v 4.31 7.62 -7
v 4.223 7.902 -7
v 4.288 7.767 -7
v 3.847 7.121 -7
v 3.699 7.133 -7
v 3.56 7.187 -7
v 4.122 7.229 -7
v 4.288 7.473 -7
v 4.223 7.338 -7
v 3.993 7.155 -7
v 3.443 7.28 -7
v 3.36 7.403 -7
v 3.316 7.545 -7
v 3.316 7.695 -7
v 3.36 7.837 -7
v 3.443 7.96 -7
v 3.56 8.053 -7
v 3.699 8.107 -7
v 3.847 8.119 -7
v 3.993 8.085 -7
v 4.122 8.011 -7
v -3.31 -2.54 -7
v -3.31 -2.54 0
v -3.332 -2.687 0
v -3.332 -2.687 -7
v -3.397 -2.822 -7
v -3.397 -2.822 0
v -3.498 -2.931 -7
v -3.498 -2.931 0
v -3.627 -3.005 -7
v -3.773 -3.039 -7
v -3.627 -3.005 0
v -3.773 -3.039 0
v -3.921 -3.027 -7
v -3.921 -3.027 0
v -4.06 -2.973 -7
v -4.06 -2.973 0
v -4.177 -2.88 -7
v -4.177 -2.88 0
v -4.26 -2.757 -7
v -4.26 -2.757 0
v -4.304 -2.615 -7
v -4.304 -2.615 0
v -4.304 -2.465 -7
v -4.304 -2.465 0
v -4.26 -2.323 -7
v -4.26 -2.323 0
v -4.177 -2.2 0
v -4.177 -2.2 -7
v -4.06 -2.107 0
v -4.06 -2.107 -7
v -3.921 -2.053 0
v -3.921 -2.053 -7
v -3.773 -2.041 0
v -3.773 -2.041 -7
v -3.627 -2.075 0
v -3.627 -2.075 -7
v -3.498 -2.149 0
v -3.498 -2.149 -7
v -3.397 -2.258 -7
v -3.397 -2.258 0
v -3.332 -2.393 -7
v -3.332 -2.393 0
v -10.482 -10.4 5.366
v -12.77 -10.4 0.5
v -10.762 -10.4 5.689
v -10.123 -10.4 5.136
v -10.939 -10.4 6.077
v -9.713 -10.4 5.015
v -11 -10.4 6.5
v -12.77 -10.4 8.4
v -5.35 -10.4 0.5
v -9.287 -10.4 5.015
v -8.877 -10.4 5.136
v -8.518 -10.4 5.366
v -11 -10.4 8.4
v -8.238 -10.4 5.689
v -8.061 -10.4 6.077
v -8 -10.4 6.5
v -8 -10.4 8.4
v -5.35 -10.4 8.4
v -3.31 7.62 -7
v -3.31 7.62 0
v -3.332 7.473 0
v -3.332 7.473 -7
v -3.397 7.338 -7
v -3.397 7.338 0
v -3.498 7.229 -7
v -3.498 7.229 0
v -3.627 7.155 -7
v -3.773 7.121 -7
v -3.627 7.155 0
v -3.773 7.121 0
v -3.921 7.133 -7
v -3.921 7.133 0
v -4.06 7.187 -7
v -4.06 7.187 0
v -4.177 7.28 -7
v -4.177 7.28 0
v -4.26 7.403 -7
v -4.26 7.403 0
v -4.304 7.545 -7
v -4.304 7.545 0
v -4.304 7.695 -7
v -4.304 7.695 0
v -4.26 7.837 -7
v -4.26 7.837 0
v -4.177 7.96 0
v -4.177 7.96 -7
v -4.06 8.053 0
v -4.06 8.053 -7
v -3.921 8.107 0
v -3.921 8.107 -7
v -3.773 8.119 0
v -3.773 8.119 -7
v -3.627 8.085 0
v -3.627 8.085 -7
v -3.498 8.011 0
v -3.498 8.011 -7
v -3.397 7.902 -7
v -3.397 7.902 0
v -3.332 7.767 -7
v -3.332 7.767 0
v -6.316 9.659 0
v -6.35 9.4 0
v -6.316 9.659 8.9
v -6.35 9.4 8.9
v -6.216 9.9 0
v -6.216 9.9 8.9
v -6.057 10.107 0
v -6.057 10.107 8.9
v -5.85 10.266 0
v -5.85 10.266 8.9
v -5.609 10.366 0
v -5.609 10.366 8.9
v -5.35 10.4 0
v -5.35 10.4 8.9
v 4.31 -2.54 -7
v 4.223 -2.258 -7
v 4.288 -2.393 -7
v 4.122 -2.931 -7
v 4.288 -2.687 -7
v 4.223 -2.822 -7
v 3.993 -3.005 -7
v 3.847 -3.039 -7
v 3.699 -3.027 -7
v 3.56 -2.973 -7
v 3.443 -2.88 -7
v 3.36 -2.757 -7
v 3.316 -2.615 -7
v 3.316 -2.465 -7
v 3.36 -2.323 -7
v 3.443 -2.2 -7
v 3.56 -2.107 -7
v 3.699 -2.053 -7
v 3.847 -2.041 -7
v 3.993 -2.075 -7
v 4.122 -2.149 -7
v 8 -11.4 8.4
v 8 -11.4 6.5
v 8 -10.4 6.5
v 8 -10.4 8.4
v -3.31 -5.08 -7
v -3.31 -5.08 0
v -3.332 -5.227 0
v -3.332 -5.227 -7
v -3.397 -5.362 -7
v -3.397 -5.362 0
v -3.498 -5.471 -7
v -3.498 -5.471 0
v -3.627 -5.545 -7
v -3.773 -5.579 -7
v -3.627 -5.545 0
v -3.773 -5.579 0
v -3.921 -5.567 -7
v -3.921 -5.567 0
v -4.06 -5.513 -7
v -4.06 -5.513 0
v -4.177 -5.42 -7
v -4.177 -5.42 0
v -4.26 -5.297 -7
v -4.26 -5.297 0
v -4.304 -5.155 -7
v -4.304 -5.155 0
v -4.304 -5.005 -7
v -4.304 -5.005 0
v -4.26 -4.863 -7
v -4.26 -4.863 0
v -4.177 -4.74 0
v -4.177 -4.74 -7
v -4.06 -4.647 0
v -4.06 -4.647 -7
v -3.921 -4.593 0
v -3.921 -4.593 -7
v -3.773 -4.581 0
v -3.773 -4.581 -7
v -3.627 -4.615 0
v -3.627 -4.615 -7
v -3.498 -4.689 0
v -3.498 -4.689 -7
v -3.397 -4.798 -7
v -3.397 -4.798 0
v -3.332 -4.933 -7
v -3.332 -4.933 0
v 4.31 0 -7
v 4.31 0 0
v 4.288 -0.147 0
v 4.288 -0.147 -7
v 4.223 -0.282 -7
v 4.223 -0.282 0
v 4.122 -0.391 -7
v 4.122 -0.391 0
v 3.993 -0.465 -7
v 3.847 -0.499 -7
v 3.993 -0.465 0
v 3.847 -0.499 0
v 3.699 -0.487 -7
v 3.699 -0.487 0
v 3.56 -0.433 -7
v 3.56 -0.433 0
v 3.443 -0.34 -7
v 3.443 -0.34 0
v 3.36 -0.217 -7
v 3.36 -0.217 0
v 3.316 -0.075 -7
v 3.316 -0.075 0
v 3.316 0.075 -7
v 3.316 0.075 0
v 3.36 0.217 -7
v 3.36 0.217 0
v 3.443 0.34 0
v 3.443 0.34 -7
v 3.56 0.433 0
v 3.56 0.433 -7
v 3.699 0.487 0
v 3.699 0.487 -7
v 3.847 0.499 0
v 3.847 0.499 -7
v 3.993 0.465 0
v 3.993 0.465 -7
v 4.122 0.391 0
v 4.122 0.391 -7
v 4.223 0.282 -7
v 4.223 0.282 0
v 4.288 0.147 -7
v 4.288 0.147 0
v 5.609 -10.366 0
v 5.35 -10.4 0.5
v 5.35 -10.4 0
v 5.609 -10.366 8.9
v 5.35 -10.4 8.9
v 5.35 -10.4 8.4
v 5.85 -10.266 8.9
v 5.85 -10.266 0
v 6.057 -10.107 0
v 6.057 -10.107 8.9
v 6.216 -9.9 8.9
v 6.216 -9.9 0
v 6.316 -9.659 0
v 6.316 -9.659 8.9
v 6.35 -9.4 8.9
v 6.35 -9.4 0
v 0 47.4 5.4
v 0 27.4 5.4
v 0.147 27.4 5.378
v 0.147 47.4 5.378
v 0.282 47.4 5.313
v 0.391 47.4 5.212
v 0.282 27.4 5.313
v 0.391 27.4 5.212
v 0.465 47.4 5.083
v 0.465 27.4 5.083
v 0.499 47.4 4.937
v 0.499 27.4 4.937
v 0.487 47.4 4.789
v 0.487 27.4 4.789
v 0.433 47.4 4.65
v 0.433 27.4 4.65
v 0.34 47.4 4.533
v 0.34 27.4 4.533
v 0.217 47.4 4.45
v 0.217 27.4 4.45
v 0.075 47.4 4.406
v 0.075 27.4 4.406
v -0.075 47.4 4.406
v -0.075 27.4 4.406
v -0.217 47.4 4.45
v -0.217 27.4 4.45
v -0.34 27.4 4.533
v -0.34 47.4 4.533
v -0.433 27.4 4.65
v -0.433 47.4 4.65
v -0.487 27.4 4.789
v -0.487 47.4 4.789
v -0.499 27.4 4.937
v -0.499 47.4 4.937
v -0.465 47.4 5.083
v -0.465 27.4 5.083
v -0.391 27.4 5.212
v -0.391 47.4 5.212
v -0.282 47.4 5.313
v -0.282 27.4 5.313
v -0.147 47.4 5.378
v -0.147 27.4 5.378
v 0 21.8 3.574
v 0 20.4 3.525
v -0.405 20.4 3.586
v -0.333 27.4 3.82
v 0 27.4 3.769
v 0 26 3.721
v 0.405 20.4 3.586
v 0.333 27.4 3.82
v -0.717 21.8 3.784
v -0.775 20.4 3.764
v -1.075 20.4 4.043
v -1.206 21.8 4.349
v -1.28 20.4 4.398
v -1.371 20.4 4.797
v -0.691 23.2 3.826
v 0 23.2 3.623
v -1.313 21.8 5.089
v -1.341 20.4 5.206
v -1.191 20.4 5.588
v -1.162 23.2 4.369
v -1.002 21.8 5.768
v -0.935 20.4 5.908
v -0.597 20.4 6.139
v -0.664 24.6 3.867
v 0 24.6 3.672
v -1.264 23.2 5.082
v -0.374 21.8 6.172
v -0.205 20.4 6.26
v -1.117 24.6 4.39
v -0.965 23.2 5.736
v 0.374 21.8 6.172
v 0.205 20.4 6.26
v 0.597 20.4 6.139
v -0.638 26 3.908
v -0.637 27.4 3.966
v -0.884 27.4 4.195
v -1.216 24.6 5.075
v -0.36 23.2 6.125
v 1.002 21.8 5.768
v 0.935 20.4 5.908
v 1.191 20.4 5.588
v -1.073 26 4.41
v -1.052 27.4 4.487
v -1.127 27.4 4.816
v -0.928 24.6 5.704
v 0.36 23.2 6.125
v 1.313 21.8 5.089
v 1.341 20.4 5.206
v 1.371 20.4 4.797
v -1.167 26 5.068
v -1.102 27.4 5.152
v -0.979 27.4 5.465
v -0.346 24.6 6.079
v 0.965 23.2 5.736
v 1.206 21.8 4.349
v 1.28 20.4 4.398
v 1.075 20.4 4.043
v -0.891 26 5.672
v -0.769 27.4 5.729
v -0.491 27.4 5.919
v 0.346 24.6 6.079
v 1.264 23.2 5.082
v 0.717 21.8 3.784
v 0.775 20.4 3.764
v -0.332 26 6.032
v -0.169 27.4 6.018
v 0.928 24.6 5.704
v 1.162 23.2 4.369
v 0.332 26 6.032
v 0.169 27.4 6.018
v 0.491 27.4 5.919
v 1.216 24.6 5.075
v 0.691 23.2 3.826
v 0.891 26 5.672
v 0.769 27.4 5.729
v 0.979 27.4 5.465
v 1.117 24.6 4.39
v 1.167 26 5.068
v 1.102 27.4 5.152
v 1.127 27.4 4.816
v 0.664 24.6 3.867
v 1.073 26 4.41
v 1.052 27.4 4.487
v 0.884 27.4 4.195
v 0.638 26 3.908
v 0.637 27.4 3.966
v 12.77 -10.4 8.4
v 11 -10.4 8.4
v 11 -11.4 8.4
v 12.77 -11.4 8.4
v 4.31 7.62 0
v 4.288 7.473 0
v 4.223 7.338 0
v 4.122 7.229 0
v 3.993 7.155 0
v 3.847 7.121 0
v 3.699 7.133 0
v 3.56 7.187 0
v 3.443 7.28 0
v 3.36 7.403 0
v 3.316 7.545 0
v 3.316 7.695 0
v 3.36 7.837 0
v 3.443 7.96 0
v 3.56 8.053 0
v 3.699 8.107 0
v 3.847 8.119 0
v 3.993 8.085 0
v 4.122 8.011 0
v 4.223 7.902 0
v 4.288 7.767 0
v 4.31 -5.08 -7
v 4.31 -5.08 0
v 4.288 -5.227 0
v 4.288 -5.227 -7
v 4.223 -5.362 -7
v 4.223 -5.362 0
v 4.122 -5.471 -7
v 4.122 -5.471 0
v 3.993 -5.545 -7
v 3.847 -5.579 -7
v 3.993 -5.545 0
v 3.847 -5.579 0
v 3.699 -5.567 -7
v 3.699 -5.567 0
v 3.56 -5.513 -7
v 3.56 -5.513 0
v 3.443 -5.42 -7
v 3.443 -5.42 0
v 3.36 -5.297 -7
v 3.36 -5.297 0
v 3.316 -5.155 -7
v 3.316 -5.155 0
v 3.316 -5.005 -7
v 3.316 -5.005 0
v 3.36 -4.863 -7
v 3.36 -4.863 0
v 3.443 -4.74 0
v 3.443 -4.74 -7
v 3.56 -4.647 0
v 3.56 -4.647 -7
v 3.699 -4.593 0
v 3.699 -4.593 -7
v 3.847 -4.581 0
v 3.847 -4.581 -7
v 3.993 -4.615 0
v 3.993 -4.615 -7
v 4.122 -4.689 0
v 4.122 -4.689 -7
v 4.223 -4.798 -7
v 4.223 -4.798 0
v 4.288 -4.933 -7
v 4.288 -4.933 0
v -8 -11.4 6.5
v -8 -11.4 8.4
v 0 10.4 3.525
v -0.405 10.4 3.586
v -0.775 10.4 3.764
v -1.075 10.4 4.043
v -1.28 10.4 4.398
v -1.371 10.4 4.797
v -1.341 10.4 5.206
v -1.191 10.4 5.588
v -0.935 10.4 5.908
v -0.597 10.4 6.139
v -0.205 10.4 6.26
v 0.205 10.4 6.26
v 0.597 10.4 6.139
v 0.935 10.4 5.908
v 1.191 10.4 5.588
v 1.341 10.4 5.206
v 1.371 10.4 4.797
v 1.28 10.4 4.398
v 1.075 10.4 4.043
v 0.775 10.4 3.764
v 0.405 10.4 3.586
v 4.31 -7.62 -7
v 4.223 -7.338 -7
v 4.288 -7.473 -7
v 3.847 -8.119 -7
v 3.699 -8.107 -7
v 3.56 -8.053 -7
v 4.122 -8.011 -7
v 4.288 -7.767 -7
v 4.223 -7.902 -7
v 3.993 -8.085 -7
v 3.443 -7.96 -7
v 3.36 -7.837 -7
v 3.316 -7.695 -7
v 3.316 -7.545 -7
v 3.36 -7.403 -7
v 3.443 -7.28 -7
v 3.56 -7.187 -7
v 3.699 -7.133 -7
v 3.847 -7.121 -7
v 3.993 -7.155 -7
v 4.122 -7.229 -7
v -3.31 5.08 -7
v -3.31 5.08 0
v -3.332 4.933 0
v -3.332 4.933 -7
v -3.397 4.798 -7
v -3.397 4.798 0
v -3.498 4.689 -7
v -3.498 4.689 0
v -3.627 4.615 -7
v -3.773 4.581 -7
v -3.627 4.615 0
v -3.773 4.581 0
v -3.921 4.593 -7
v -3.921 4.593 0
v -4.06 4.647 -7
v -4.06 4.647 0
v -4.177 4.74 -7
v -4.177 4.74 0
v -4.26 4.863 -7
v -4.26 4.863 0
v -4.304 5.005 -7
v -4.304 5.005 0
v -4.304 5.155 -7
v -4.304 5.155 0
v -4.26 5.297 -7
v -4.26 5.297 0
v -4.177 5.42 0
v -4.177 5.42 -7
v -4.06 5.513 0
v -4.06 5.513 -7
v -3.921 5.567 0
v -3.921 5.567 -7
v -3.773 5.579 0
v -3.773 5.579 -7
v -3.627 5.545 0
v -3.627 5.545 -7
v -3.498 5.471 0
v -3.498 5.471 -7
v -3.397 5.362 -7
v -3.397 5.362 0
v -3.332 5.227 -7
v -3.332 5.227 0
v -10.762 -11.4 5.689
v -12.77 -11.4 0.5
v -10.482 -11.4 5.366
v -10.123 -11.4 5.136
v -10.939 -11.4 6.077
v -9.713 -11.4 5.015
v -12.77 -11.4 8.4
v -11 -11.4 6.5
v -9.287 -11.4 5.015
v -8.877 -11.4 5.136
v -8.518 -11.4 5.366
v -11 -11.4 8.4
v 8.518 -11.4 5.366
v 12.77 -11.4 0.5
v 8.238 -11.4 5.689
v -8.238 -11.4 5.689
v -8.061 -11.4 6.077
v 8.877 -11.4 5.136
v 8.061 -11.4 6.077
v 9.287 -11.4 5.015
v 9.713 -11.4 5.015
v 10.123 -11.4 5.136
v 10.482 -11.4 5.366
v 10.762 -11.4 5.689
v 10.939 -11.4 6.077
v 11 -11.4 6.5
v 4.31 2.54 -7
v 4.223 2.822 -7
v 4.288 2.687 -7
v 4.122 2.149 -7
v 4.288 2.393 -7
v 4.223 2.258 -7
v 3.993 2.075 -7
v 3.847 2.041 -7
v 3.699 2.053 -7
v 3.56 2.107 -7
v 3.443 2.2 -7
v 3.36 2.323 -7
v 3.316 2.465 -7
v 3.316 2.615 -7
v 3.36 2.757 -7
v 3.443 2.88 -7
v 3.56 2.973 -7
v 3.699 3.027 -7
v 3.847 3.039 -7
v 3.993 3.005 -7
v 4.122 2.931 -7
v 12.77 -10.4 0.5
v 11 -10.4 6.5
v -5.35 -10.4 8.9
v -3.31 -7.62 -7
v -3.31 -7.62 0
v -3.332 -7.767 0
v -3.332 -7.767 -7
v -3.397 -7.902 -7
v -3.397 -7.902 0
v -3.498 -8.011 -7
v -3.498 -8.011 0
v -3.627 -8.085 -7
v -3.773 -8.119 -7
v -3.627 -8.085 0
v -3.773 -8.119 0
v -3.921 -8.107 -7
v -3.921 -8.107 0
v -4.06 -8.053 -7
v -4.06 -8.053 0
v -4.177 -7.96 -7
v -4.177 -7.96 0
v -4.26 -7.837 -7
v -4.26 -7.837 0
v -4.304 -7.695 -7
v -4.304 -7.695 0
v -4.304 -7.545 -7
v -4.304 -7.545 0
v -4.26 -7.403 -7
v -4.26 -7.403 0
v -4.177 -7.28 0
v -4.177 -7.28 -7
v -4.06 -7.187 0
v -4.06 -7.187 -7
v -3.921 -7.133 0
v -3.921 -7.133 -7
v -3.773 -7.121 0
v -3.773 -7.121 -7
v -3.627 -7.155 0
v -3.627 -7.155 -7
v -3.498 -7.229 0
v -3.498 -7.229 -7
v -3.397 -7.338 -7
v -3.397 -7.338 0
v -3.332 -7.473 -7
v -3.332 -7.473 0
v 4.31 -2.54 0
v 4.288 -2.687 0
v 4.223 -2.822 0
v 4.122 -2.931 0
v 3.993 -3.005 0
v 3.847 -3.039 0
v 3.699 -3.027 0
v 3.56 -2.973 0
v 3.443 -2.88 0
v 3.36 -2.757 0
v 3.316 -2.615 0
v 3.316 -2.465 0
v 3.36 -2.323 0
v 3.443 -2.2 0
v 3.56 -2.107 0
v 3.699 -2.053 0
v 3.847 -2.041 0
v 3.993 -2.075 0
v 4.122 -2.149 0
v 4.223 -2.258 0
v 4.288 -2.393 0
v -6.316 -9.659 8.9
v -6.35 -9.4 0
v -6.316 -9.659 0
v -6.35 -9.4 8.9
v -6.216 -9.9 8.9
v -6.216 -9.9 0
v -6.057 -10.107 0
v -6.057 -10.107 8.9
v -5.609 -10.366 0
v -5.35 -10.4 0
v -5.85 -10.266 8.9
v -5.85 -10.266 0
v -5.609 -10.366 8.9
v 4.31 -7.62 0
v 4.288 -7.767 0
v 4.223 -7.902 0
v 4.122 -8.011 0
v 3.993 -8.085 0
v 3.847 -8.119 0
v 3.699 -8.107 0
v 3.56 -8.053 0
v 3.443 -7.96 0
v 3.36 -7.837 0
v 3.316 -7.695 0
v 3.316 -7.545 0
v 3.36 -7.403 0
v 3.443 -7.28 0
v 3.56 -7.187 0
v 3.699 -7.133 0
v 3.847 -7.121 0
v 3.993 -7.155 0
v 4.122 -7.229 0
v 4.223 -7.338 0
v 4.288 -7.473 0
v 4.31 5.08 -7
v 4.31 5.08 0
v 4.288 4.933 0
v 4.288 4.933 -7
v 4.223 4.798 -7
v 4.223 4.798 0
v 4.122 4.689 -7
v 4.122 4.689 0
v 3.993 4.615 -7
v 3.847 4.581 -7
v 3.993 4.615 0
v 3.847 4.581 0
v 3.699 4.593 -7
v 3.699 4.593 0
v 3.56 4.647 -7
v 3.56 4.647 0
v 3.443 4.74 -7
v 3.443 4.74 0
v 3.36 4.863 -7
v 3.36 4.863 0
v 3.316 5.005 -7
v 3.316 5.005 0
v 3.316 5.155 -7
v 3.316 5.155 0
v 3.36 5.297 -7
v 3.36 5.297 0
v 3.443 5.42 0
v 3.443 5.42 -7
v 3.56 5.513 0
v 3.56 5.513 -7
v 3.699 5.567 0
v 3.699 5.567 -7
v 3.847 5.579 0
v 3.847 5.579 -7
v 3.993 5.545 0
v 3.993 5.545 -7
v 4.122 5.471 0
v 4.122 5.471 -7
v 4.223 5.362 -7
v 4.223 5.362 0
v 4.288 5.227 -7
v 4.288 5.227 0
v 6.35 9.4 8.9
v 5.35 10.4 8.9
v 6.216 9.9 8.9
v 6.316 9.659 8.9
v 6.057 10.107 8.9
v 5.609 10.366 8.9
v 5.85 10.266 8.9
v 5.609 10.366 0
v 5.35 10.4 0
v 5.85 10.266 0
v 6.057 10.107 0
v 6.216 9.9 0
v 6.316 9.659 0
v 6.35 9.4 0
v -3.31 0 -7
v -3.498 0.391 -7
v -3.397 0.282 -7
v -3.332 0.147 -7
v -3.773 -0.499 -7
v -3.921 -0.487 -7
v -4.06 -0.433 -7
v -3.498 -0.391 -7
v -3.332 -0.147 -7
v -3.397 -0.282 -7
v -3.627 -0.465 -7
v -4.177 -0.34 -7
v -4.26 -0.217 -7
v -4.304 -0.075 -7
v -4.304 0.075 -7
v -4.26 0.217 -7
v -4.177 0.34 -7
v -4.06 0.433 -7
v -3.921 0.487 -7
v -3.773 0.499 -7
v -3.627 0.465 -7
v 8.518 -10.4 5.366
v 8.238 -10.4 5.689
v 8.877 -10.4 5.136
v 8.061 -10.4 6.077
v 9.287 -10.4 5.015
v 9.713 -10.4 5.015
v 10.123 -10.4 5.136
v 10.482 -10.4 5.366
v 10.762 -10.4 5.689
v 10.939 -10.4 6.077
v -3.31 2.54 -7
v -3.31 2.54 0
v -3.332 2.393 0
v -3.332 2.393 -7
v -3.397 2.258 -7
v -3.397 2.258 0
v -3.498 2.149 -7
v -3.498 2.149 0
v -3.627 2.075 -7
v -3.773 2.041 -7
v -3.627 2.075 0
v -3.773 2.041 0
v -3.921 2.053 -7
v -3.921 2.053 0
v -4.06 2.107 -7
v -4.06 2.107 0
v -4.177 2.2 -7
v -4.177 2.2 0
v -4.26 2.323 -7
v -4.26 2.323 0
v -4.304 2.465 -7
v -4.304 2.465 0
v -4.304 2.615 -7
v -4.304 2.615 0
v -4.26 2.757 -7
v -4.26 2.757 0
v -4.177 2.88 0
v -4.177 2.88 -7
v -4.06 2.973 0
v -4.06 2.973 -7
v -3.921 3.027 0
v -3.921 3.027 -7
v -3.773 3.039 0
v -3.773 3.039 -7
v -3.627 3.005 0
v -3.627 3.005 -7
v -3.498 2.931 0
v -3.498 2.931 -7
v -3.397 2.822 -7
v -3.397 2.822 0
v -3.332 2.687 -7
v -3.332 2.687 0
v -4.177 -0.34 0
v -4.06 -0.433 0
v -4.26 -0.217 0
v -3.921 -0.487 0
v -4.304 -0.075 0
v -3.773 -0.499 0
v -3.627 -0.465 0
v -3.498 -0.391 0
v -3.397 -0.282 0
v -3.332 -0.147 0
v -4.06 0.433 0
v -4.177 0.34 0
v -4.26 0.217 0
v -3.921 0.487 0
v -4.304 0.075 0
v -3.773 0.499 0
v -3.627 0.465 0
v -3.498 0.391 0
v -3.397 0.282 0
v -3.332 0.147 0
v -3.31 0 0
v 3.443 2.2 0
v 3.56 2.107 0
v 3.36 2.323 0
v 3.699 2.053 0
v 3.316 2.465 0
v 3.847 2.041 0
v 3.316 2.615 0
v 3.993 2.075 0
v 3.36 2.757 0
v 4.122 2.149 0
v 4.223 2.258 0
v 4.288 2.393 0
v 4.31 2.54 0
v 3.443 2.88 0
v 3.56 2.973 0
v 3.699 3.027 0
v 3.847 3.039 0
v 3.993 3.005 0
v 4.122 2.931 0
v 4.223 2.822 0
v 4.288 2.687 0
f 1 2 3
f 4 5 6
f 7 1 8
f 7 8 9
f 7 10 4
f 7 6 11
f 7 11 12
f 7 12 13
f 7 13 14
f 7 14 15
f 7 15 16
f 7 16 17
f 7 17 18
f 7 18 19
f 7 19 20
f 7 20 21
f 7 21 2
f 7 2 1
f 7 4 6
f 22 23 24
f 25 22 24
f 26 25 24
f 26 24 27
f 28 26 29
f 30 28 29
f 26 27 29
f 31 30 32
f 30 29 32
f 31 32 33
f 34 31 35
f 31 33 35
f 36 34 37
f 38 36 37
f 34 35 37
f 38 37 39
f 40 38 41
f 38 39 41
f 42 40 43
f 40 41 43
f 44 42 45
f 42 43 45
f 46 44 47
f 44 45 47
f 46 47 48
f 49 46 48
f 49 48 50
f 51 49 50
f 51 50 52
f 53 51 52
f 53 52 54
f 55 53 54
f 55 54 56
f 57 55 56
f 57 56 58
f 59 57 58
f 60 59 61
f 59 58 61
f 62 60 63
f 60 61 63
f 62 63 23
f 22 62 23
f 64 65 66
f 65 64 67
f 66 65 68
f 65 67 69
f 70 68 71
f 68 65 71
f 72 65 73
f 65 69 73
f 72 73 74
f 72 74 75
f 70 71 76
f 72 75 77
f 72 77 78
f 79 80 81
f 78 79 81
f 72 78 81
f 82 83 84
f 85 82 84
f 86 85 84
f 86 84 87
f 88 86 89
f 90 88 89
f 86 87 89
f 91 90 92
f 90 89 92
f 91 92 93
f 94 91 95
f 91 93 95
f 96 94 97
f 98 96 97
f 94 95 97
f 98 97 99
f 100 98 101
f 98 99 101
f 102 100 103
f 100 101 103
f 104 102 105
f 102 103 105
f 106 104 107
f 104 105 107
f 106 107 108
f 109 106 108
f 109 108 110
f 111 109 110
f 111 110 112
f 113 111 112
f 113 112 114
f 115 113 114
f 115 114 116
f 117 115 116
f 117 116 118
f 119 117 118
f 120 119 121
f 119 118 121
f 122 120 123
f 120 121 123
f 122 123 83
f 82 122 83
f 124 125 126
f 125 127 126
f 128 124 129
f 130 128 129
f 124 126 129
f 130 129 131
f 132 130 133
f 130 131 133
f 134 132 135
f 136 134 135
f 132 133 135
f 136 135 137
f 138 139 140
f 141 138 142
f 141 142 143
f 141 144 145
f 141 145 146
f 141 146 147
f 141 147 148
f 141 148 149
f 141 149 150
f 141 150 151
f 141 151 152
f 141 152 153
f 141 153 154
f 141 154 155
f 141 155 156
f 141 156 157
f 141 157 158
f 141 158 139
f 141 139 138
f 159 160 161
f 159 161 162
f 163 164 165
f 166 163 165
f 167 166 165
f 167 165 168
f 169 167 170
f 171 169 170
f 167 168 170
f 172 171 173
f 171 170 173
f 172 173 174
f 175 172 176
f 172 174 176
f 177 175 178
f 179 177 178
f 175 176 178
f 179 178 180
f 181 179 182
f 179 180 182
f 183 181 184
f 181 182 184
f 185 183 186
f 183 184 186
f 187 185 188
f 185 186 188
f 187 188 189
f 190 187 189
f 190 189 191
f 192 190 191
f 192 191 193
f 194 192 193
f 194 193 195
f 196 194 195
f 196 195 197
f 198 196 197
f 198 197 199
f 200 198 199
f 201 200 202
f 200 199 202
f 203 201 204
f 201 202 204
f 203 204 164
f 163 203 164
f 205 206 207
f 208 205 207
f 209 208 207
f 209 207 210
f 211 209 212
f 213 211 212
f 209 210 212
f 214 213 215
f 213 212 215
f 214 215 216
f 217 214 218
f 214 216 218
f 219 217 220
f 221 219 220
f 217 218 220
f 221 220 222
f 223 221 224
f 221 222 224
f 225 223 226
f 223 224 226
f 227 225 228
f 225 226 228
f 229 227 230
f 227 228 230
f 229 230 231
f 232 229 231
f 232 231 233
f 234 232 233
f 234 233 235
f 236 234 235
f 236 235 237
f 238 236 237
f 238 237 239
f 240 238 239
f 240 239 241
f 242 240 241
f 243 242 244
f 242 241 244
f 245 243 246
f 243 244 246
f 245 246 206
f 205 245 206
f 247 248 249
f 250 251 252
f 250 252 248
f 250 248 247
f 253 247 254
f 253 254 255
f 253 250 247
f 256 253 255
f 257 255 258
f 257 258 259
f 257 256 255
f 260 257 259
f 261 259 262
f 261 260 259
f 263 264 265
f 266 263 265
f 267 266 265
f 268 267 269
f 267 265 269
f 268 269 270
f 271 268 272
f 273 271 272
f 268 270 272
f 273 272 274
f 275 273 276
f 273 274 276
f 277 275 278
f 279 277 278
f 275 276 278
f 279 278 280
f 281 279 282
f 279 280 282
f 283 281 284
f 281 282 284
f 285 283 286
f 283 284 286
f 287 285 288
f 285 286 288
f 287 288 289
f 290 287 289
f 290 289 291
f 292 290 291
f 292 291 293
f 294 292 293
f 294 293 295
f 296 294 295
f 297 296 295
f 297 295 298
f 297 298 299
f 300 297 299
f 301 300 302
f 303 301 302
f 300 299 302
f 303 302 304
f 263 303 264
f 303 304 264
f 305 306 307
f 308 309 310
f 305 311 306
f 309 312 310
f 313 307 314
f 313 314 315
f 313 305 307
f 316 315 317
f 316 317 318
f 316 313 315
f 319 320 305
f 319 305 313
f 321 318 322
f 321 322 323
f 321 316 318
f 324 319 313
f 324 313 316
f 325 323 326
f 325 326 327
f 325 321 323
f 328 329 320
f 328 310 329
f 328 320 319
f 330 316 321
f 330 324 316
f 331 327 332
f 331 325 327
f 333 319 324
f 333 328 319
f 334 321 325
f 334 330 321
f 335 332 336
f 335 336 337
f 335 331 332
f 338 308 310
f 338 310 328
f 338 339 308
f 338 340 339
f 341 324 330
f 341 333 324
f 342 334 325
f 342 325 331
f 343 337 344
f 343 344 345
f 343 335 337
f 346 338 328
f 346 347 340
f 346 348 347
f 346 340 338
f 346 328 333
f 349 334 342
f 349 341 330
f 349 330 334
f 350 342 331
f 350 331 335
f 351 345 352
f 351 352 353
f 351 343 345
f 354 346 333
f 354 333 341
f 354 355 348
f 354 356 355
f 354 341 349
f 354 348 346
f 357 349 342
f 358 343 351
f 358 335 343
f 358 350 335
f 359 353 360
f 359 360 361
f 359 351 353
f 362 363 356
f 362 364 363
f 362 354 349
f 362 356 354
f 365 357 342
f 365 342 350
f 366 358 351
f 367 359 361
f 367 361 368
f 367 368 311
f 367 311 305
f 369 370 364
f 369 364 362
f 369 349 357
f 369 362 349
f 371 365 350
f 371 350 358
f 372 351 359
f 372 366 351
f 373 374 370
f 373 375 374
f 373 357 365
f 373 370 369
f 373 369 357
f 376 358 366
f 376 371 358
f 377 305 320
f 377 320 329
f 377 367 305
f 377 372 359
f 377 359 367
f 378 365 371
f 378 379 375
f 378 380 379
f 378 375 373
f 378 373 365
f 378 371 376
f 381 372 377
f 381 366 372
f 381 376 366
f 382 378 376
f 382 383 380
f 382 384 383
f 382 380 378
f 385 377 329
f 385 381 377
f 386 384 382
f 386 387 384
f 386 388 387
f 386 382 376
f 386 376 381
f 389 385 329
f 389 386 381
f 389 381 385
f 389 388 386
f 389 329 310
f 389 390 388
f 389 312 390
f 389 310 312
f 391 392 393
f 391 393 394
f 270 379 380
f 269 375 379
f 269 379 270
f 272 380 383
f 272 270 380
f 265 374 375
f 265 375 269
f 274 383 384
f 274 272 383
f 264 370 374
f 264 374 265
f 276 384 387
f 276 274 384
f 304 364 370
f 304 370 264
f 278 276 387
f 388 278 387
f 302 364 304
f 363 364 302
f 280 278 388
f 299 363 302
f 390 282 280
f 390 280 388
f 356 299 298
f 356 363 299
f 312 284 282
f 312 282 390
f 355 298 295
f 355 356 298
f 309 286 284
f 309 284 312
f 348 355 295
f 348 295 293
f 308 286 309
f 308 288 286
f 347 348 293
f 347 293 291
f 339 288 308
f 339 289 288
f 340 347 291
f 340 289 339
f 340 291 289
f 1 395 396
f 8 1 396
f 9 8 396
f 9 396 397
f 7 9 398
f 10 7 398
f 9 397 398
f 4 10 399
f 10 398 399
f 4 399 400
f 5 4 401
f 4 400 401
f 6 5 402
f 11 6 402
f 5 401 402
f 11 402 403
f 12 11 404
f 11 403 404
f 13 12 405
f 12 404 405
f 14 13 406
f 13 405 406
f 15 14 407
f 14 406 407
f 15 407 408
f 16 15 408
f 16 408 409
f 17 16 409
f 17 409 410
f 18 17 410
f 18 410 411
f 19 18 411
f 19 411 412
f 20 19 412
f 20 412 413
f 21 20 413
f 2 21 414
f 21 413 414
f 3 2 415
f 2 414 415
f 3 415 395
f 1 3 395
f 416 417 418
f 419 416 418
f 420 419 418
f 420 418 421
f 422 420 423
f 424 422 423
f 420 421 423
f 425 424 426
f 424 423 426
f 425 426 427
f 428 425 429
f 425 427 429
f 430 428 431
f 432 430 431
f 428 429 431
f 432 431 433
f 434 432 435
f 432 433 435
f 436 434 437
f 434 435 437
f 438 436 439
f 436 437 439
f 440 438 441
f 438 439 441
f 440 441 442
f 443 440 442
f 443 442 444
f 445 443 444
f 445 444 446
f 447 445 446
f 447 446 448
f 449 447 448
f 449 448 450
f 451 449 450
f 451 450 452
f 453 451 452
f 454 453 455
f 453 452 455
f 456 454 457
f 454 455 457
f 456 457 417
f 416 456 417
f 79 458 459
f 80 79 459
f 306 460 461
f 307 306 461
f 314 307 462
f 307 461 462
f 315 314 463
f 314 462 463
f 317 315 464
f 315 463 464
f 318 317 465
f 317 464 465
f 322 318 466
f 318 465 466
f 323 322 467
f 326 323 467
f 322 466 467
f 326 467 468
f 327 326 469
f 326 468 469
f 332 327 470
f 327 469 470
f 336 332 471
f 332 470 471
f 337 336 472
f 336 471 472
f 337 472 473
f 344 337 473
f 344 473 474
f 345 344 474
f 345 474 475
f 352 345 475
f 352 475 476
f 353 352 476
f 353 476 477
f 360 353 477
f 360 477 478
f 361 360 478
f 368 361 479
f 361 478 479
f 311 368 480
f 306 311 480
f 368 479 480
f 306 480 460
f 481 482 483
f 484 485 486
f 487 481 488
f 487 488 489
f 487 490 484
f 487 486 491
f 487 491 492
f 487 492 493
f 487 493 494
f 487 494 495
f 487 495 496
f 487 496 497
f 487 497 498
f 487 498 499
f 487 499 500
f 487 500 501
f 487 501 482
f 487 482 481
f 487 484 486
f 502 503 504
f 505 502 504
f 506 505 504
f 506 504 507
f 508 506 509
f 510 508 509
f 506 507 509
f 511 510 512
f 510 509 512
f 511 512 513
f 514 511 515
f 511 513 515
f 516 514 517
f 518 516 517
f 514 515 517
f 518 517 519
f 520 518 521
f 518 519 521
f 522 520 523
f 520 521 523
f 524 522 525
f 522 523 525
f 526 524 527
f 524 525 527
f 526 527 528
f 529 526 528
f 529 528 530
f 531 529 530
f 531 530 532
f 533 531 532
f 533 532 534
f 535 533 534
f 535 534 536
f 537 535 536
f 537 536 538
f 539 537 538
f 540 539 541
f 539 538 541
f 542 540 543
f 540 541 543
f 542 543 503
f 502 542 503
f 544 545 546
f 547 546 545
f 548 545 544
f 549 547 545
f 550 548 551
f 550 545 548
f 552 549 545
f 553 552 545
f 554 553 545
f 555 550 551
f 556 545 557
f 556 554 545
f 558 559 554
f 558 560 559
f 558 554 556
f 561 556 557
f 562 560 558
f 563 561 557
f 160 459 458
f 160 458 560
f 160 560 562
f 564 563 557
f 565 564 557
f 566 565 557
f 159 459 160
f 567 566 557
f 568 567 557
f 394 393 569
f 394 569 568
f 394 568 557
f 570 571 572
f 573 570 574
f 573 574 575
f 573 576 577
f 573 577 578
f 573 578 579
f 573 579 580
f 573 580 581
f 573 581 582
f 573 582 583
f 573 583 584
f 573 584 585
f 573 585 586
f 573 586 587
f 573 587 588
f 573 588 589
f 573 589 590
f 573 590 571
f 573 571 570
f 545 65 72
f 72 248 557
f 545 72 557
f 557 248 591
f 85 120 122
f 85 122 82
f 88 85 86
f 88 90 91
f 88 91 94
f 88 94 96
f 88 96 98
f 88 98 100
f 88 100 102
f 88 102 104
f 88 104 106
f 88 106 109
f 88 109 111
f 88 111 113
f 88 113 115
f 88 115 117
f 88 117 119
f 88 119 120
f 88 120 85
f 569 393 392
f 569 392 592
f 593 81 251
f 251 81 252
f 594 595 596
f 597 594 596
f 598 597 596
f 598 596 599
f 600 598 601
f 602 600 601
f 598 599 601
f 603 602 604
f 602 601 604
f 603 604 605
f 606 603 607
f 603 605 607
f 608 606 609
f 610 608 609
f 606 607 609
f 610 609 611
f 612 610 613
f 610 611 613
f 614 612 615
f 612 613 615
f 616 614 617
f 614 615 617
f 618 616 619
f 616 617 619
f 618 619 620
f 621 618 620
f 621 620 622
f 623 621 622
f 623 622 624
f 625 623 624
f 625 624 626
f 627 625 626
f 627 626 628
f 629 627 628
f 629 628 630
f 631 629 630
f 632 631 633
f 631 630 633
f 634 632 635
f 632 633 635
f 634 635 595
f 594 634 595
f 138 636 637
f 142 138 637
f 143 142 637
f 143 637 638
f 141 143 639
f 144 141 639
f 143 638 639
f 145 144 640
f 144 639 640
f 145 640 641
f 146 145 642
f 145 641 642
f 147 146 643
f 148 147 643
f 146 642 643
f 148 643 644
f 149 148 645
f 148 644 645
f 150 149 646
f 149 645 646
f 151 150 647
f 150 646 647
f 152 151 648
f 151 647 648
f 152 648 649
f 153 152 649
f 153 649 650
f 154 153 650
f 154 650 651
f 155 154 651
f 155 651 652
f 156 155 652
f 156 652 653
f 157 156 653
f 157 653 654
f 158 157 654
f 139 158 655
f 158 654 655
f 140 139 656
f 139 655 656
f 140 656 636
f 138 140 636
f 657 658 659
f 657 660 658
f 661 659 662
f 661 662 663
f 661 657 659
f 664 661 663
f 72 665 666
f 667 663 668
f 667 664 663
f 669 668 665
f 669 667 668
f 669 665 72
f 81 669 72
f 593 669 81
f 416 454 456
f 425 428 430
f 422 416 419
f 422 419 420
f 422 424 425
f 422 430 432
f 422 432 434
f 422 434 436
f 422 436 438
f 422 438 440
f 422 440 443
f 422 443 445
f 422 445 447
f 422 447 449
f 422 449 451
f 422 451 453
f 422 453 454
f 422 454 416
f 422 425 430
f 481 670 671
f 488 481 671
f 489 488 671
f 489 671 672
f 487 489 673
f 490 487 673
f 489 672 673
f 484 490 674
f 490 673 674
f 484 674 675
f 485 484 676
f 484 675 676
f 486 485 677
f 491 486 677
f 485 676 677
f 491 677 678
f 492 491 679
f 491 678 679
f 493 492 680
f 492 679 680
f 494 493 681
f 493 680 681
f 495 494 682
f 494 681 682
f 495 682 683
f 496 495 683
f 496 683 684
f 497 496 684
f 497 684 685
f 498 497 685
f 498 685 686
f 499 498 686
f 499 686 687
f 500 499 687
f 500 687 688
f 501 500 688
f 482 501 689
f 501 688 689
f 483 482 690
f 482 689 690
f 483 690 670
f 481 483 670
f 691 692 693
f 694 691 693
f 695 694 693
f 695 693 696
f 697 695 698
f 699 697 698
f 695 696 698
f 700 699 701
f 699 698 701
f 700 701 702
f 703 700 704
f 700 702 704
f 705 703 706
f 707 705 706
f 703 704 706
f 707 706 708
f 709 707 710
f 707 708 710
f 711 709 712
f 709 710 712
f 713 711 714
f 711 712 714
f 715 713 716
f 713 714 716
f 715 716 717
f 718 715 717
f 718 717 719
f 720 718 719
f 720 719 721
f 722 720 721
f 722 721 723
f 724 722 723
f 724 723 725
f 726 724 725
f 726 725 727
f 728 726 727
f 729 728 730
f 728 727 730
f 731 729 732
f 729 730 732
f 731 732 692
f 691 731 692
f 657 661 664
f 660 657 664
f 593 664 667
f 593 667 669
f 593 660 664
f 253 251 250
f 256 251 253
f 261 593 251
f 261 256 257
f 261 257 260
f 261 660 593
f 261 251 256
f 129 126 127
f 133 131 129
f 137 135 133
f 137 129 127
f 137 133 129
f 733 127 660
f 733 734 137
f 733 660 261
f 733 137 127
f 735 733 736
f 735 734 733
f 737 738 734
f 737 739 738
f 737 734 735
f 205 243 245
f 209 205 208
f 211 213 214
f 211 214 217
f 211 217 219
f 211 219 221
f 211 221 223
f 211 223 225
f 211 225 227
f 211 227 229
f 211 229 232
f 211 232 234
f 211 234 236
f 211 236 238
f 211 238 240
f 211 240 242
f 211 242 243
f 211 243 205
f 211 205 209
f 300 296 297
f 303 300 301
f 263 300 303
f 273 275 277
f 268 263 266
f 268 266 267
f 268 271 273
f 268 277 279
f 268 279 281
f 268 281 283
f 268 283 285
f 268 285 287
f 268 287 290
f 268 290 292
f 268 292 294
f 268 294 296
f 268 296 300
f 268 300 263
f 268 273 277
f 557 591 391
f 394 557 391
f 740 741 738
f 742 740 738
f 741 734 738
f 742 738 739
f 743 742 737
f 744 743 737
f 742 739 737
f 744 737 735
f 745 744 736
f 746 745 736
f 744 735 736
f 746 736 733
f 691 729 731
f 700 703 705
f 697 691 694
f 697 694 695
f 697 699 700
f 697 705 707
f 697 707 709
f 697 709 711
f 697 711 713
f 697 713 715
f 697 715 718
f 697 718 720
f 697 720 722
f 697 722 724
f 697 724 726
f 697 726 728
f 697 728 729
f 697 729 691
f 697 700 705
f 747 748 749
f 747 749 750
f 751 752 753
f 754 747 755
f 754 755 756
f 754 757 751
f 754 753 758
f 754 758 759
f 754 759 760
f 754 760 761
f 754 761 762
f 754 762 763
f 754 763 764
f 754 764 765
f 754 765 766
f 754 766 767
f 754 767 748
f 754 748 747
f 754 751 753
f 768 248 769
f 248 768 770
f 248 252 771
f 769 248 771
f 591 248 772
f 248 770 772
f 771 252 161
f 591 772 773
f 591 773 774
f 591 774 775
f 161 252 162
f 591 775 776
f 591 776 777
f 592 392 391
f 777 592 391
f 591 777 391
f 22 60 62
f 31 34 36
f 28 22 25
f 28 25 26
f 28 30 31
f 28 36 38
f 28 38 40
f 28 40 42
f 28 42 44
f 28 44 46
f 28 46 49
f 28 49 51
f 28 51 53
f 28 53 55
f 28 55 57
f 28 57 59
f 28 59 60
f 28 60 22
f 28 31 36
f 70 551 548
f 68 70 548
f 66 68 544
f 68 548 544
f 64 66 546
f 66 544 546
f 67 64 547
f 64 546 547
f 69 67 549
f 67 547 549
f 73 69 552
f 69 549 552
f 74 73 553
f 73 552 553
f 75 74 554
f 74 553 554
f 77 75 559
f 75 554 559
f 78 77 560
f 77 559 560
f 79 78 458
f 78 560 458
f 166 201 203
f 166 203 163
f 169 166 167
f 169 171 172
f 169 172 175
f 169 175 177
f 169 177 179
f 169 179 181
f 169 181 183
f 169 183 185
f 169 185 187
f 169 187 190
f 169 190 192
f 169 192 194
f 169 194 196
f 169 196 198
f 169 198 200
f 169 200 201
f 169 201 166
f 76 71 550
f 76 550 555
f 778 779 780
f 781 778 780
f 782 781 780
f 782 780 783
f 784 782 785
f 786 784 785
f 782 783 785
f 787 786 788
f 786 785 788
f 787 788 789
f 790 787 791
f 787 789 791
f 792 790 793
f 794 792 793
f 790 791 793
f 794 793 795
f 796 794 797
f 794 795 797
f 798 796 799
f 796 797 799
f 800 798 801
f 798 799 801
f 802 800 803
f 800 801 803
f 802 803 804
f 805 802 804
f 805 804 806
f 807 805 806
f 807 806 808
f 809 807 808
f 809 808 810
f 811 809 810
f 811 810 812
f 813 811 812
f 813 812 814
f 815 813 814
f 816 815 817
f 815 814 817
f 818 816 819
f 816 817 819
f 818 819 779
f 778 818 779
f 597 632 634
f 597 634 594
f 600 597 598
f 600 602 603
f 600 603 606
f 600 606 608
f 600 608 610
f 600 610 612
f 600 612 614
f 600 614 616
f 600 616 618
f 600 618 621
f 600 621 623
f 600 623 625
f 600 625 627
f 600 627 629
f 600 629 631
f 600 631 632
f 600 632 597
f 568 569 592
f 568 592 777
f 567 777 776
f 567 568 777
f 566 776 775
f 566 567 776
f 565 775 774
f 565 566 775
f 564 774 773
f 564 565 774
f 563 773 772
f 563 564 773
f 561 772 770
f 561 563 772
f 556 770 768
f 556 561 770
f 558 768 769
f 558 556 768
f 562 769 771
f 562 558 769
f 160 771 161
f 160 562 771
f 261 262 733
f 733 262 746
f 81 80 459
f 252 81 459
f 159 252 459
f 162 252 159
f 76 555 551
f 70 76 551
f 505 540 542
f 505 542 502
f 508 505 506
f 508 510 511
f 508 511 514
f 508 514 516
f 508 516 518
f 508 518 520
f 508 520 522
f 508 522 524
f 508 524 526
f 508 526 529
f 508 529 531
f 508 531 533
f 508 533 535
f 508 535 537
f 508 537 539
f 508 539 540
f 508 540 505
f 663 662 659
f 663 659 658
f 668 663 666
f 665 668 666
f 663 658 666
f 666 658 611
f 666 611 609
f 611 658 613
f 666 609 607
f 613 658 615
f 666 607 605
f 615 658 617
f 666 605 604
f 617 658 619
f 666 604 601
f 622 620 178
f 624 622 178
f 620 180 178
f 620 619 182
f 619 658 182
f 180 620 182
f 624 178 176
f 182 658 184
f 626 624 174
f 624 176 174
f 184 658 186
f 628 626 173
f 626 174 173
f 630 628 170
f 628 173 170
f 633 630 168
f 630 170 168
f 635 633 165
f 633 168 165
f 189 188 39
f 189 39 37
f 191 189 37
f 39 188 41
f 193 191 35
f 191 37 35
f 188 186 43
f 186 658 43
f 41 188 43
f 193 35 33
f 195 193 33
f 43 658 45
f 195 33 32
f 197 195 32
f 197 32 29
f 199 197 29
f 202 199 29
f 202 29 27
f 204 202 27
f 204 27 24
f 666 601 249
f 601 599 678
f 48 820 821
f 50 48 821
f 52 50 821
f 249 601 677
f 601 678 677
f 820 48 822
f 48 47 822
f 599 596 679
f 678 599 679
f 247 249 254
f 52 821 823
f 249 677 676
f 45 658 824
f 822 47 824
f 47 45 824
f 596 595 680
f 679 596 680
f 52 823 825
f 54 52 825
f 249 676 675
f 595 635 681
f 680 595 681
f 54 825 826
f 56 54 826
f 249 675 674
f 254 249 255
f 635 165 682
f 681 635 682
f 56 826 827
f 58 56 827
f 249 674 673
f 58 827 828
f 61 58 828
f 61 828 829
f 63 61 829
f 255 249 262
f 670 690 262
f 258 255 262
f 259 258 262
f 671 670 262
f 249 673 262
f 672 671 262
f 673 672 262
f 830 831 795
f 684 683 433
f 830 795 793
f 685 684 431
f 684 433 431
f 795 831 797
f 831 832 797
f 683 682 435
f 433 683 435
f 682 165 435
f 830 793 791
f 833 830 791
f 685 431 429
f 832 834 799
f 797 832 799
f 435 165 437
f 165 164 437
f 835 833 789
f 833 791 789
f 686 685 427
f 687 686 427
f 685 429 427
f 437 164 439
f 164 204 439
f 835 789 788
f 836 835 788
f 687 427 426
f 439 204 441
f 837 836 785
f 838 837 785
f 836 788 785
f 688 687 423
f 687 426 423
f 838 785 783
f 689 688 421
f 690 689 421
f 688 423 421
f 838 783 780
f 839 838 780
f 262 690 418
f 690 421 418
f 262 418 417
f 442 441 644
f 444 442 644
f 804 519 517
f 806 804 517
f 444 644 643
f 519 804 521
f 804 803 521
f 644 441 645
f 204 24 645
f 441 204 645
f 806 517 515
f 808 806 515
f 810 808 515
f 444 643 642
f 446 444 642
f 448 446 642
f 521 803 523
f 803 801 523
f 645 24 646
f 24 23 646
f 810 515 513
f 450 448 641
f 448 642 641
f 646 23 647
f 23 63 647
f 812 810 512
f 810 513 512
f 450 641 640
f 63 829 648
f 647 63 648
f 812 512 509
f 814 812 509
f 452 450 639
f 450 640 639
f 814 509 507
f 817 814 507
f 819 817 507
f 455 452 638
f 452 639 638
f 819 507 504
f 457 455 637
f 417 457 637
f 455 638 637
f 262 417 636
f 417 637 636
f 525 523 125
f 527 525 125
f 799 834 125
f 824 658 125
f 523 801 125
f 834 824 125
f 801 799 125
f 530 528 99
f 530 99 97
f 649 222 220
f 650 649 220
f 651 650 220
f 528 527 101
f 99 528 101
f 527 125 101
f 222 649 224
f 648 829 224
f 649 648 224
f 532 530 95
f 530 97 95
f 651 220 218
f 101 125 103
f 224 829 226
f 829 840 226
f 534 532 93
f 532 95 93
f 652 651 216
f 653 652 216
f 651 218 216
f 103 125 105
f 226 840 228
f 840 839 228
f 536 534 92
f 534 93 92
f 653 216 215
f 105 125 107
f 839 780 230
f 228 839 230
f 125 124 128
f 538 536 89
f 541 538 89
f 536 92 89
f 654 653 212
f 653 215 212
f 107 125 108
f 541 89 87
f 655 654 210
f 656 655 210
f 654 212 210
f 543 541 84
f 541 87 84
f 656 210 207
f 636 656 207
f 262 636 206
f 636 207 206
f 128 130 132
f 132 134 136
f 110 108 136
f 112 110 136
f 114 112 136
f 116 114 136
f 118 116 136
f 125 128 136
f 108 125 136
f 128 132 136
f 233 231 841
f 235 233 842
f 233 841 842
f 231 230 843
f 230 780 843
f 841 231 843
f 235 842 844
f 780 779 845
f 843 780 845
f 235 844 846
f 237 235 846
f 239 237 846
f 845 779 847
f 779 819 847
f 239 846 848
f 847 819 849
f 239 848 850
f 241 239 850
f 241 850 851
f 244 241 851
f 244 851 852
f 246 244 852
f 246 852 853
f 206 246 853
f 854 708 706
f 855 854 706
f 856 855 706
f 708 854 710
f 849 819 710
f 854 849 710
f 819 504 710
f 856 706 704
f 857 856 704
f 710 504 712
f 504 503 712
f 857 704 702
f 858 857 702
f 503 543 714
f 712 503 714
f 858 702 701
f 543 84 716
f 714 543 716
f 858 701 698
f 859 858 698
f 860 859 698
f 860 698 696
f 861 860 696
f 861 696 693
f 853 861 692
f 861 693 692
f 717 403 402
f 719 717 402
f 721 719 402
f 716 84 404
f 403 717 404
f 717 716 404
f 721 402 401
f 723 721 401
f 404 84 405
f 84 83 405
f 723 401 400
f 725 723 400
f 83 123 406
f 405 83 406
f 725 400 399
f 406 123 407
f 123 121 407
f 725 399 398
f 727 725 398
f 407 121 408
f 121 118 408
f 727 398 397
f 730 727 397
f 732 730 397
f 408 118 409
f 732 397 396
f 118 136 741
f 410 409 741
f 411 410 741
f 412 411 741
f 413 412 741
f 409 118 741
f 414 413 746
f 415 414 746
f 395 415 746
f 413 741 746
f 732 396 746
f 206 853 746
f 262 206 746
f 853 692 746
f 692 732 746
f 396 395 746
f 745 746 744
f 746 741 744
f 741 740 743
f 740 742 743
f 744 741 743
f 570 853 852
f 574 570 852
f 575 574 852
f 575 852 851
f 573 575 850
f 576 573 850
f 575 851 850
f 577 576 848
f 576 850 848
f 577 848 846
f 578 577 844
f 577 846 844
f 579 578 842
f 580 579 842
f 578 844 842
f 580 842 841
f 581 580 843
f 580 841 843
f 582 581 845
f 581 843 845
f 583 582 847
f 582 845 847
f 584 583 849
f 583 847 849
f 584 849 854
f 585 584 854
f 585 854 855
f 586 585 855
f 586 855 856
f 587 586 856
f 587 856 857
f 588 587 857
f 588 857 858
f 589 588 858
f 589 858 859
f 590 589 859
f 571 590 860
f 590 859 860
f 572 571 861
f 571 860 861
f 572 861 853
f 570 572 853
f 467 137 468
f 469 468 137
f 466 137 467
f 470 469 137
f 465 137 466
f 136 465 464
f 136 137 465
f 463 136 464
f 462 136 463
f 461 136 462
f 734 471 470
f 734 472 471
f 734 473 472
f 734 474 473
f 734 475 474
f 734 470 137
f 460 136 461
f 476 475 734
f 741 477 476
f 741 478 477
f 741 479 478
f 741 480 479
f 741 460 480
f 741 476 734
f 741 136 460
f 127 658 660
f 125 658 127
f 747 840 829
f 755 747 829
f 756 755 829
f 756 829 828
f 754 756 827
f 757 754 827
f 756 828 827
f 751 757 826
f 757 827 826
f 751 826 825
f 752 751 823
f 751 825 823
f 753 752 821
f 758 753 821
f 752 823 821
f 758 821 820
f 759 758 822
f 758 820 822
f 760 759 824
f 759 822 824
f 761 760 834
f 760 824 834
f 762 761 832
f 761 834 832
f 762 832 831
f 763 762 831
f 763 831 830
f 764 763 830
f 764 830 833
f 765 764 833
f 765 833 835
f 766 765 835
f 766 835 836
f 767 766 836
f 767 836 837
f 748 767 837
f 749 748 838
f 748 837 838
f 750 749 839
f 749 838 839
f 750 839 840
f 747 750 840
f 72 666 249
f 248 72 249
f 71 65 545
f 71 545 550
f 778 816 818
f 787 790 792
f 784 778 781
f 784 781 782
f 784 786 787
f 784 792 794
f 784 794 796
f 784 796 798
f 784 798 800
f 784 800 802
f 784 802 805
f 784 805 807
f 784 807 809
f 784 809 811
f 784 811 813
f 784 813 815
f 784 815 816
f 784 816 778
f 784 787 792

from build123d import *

# Parameters (mm, degrees)
SKETCH_1_W          = 12.7
SKETCH_1_H          = 20.8
EXTRUDE_1_DEPTH     = 8.9
SKETCH_2_R          = 0.5
EXTRUDE_2_DEPTH     = 7
FILLET_1_R          = 1
SKETCH_3_W          = 25.54
SKETCH_3_H          = 7.9
EXTRUDE_3_DEPTH     = 1
CUT_EXTRUDE_1_DEPTH = 27.786617928
SKETCH_5_R          = 1.375
EXTRUDE_4_DEPTH     = 17
CHAMFER_1_SIZE      = 7
CHAMFER_1_SIZE2     = 0.244445386
SKETCH_7_R          = 0.5
EXTRUDE_5_DEPTH     = 20


with BuildPart() as part:
    # 草图1 → 凸台-拉伸1 (new body)
    with BuildSketch(Plane.XY):
        Rectangle(SKETCH_1_W, SKETCH_1_H)
    extrude(amount=EXTRUDE_1_DEPTH)

    # 草图2 → 凸台-拉伸2 (add)
    with BuildSketch(Plane(origin=(0, 0, 0), x_dir=(-1, 0, 0), z_dir=(0, 0, -1))):
        with Locations(Location((-3.81, 0, 0), (0, 0, 180))):
            Circle(SKETCH_2_R)
        with Locations(Location((-3.81, 2.54, 0), (0, 0, 180))):
            Circle(SKETCH_2_R)
        with Locations(Location((-3.81, 5.08, 0), (0, 0, 180))):
            Circle(SKETCH_2_R)
        with Locations(Location((-3.81, 7.62, 0), (0, 0, 180))):
            Circle(SKETCH_2_R)
        with Locations(Location((-3.81, -2.54, 0), (0, 0, 180))):
            Circle(SKETCH_2_R)
        with Locations(Location((-3.81, -5.08, 0), (0, 0, 180))):
            Circle(SKETCH_2_R)
        with Locations(Location((-3.81, -7.62, 0), (0, 0, 180))):
            Circle(SKETCH_2_R)
        with Locations(Location((3.81, -7.62, 0), (0, 0, 180))):
            Circle(SKETCH_2_R)
        with Locations(Location((3.81, -5.08, 0), (0, 0, 180))):
            Circle(SKETCH_2_R)
        with Locations(Location((3.81, -2.54, 0), (0, 0, 180))):
            Circle(SKETCH_2_R)
        with Locations(Location((3.81, 7.62, 0), (0, 0, 180))):
            Circle(SKETCH_2_R)
        with Locations(Location((3.81, 5.08, 0), (0, 0, 180))):
            Circle(SKETCH_2_R)
        with Locations(Location((3.81, 2.54, 0), (0, 0, 180))):
            Circle(SKETCH_2_R)
        with Locations(Location((3.81, 0, 0), (0, 0, 180))):
            Circle(SKETCH_2_R)
    extrude(amount=EXTRUDE_2_DEPTH)

    # 圆角1
    fillet_1_edges = [part.edges().sort_by_distance(p)[0] for p in [
        (-6.35, 10.4, 4.45),
        (6.35, 10.4, 4.45),
        (6.35, -10.4, 4.45),
        (-6.35, -10.4, 4.45),
    ]]
    fillet(fillet_1_edges, radius=FILLET_1_R)

    # 草图3 → 凸台-拉伸3 (add)
    with BuildSketch(Plane.XZ.offset(10.4)):
        with Locations((0, 4.45)):
            Rectangle(SKETCH_3_W, SKETCH_3_H)
    extrude(amount=EXTRUDE_3_DEPTH)

    # 草图4 → 切除-拉伸1 (cut, through all)
    with BuildSketch(Plane.XZ.offset(11.4)):
        with BuildLine():
            Line((8, 6.5), (8, 8.4))
            Line((8, 8.4), (11, 8.4))
            Line((11, 8.4), (11, 6.5))
            ThreePointArc((11, 6.5), (9.5, 5), (8, 6.5))
        make_face()
        with BuildLine():
            Line((-8, 8.4), (-11, 8.4))
            Line((-11, 8.4), (-11, 6.5))
            ThreePointArc((-11, 6.5), (-9.5, 5), (-8, 6.5))
            Line((-8, 6.5), (-8, 8.4))
        make_face()
    extrude(amount=-CUT_EXTRUDE_1_DEPTH, mode=Mode.SUBTRACT)

    # 草图5 → 凸台-拉伸4 (add)
    with BuildSketch(Plane(origin=(0, 10.4, 0), x_dir=(1, 0, 0), z_dir=(0, 1, 0))):
        with Locations(Location((0, -4.9, 0), (0, 0, 90))):
            Circle(SKETCH_5_R)
    extrude(amount=EXTRUDE_4_DEPTH)

    # 倒角1
    chamfer_1_edges = [part.edges().sort_by_distance(p)[0] for p in [
        (0, 27.4, 6.275),
    ]]
    chamfer_1_side = [part.faces().sort_by_distance(p)[0] for p in [
        (0, 18.9, 6.275),
    ]]
    chamfer(chamfer_1_edges, length=CHAMFER_1_SIZE, length2=CHAMFER_1_SIZE2, reference=chamfer_1_side[0])

    # 草图7 → 凸台-拉伸5 (add)
    with BuildSketch(Plane(origin=(0, 27.4, 0), x_dir=(1, 0, 0), z_dir=(0, 1, 0))):
        with Locations(Location((0, -4.9, 0), (0, 0, 270))):
            Circle(SKETCH_7_R)
    extrude(amount=EXTRUDE_5_DEPTH)


solid = part.part
